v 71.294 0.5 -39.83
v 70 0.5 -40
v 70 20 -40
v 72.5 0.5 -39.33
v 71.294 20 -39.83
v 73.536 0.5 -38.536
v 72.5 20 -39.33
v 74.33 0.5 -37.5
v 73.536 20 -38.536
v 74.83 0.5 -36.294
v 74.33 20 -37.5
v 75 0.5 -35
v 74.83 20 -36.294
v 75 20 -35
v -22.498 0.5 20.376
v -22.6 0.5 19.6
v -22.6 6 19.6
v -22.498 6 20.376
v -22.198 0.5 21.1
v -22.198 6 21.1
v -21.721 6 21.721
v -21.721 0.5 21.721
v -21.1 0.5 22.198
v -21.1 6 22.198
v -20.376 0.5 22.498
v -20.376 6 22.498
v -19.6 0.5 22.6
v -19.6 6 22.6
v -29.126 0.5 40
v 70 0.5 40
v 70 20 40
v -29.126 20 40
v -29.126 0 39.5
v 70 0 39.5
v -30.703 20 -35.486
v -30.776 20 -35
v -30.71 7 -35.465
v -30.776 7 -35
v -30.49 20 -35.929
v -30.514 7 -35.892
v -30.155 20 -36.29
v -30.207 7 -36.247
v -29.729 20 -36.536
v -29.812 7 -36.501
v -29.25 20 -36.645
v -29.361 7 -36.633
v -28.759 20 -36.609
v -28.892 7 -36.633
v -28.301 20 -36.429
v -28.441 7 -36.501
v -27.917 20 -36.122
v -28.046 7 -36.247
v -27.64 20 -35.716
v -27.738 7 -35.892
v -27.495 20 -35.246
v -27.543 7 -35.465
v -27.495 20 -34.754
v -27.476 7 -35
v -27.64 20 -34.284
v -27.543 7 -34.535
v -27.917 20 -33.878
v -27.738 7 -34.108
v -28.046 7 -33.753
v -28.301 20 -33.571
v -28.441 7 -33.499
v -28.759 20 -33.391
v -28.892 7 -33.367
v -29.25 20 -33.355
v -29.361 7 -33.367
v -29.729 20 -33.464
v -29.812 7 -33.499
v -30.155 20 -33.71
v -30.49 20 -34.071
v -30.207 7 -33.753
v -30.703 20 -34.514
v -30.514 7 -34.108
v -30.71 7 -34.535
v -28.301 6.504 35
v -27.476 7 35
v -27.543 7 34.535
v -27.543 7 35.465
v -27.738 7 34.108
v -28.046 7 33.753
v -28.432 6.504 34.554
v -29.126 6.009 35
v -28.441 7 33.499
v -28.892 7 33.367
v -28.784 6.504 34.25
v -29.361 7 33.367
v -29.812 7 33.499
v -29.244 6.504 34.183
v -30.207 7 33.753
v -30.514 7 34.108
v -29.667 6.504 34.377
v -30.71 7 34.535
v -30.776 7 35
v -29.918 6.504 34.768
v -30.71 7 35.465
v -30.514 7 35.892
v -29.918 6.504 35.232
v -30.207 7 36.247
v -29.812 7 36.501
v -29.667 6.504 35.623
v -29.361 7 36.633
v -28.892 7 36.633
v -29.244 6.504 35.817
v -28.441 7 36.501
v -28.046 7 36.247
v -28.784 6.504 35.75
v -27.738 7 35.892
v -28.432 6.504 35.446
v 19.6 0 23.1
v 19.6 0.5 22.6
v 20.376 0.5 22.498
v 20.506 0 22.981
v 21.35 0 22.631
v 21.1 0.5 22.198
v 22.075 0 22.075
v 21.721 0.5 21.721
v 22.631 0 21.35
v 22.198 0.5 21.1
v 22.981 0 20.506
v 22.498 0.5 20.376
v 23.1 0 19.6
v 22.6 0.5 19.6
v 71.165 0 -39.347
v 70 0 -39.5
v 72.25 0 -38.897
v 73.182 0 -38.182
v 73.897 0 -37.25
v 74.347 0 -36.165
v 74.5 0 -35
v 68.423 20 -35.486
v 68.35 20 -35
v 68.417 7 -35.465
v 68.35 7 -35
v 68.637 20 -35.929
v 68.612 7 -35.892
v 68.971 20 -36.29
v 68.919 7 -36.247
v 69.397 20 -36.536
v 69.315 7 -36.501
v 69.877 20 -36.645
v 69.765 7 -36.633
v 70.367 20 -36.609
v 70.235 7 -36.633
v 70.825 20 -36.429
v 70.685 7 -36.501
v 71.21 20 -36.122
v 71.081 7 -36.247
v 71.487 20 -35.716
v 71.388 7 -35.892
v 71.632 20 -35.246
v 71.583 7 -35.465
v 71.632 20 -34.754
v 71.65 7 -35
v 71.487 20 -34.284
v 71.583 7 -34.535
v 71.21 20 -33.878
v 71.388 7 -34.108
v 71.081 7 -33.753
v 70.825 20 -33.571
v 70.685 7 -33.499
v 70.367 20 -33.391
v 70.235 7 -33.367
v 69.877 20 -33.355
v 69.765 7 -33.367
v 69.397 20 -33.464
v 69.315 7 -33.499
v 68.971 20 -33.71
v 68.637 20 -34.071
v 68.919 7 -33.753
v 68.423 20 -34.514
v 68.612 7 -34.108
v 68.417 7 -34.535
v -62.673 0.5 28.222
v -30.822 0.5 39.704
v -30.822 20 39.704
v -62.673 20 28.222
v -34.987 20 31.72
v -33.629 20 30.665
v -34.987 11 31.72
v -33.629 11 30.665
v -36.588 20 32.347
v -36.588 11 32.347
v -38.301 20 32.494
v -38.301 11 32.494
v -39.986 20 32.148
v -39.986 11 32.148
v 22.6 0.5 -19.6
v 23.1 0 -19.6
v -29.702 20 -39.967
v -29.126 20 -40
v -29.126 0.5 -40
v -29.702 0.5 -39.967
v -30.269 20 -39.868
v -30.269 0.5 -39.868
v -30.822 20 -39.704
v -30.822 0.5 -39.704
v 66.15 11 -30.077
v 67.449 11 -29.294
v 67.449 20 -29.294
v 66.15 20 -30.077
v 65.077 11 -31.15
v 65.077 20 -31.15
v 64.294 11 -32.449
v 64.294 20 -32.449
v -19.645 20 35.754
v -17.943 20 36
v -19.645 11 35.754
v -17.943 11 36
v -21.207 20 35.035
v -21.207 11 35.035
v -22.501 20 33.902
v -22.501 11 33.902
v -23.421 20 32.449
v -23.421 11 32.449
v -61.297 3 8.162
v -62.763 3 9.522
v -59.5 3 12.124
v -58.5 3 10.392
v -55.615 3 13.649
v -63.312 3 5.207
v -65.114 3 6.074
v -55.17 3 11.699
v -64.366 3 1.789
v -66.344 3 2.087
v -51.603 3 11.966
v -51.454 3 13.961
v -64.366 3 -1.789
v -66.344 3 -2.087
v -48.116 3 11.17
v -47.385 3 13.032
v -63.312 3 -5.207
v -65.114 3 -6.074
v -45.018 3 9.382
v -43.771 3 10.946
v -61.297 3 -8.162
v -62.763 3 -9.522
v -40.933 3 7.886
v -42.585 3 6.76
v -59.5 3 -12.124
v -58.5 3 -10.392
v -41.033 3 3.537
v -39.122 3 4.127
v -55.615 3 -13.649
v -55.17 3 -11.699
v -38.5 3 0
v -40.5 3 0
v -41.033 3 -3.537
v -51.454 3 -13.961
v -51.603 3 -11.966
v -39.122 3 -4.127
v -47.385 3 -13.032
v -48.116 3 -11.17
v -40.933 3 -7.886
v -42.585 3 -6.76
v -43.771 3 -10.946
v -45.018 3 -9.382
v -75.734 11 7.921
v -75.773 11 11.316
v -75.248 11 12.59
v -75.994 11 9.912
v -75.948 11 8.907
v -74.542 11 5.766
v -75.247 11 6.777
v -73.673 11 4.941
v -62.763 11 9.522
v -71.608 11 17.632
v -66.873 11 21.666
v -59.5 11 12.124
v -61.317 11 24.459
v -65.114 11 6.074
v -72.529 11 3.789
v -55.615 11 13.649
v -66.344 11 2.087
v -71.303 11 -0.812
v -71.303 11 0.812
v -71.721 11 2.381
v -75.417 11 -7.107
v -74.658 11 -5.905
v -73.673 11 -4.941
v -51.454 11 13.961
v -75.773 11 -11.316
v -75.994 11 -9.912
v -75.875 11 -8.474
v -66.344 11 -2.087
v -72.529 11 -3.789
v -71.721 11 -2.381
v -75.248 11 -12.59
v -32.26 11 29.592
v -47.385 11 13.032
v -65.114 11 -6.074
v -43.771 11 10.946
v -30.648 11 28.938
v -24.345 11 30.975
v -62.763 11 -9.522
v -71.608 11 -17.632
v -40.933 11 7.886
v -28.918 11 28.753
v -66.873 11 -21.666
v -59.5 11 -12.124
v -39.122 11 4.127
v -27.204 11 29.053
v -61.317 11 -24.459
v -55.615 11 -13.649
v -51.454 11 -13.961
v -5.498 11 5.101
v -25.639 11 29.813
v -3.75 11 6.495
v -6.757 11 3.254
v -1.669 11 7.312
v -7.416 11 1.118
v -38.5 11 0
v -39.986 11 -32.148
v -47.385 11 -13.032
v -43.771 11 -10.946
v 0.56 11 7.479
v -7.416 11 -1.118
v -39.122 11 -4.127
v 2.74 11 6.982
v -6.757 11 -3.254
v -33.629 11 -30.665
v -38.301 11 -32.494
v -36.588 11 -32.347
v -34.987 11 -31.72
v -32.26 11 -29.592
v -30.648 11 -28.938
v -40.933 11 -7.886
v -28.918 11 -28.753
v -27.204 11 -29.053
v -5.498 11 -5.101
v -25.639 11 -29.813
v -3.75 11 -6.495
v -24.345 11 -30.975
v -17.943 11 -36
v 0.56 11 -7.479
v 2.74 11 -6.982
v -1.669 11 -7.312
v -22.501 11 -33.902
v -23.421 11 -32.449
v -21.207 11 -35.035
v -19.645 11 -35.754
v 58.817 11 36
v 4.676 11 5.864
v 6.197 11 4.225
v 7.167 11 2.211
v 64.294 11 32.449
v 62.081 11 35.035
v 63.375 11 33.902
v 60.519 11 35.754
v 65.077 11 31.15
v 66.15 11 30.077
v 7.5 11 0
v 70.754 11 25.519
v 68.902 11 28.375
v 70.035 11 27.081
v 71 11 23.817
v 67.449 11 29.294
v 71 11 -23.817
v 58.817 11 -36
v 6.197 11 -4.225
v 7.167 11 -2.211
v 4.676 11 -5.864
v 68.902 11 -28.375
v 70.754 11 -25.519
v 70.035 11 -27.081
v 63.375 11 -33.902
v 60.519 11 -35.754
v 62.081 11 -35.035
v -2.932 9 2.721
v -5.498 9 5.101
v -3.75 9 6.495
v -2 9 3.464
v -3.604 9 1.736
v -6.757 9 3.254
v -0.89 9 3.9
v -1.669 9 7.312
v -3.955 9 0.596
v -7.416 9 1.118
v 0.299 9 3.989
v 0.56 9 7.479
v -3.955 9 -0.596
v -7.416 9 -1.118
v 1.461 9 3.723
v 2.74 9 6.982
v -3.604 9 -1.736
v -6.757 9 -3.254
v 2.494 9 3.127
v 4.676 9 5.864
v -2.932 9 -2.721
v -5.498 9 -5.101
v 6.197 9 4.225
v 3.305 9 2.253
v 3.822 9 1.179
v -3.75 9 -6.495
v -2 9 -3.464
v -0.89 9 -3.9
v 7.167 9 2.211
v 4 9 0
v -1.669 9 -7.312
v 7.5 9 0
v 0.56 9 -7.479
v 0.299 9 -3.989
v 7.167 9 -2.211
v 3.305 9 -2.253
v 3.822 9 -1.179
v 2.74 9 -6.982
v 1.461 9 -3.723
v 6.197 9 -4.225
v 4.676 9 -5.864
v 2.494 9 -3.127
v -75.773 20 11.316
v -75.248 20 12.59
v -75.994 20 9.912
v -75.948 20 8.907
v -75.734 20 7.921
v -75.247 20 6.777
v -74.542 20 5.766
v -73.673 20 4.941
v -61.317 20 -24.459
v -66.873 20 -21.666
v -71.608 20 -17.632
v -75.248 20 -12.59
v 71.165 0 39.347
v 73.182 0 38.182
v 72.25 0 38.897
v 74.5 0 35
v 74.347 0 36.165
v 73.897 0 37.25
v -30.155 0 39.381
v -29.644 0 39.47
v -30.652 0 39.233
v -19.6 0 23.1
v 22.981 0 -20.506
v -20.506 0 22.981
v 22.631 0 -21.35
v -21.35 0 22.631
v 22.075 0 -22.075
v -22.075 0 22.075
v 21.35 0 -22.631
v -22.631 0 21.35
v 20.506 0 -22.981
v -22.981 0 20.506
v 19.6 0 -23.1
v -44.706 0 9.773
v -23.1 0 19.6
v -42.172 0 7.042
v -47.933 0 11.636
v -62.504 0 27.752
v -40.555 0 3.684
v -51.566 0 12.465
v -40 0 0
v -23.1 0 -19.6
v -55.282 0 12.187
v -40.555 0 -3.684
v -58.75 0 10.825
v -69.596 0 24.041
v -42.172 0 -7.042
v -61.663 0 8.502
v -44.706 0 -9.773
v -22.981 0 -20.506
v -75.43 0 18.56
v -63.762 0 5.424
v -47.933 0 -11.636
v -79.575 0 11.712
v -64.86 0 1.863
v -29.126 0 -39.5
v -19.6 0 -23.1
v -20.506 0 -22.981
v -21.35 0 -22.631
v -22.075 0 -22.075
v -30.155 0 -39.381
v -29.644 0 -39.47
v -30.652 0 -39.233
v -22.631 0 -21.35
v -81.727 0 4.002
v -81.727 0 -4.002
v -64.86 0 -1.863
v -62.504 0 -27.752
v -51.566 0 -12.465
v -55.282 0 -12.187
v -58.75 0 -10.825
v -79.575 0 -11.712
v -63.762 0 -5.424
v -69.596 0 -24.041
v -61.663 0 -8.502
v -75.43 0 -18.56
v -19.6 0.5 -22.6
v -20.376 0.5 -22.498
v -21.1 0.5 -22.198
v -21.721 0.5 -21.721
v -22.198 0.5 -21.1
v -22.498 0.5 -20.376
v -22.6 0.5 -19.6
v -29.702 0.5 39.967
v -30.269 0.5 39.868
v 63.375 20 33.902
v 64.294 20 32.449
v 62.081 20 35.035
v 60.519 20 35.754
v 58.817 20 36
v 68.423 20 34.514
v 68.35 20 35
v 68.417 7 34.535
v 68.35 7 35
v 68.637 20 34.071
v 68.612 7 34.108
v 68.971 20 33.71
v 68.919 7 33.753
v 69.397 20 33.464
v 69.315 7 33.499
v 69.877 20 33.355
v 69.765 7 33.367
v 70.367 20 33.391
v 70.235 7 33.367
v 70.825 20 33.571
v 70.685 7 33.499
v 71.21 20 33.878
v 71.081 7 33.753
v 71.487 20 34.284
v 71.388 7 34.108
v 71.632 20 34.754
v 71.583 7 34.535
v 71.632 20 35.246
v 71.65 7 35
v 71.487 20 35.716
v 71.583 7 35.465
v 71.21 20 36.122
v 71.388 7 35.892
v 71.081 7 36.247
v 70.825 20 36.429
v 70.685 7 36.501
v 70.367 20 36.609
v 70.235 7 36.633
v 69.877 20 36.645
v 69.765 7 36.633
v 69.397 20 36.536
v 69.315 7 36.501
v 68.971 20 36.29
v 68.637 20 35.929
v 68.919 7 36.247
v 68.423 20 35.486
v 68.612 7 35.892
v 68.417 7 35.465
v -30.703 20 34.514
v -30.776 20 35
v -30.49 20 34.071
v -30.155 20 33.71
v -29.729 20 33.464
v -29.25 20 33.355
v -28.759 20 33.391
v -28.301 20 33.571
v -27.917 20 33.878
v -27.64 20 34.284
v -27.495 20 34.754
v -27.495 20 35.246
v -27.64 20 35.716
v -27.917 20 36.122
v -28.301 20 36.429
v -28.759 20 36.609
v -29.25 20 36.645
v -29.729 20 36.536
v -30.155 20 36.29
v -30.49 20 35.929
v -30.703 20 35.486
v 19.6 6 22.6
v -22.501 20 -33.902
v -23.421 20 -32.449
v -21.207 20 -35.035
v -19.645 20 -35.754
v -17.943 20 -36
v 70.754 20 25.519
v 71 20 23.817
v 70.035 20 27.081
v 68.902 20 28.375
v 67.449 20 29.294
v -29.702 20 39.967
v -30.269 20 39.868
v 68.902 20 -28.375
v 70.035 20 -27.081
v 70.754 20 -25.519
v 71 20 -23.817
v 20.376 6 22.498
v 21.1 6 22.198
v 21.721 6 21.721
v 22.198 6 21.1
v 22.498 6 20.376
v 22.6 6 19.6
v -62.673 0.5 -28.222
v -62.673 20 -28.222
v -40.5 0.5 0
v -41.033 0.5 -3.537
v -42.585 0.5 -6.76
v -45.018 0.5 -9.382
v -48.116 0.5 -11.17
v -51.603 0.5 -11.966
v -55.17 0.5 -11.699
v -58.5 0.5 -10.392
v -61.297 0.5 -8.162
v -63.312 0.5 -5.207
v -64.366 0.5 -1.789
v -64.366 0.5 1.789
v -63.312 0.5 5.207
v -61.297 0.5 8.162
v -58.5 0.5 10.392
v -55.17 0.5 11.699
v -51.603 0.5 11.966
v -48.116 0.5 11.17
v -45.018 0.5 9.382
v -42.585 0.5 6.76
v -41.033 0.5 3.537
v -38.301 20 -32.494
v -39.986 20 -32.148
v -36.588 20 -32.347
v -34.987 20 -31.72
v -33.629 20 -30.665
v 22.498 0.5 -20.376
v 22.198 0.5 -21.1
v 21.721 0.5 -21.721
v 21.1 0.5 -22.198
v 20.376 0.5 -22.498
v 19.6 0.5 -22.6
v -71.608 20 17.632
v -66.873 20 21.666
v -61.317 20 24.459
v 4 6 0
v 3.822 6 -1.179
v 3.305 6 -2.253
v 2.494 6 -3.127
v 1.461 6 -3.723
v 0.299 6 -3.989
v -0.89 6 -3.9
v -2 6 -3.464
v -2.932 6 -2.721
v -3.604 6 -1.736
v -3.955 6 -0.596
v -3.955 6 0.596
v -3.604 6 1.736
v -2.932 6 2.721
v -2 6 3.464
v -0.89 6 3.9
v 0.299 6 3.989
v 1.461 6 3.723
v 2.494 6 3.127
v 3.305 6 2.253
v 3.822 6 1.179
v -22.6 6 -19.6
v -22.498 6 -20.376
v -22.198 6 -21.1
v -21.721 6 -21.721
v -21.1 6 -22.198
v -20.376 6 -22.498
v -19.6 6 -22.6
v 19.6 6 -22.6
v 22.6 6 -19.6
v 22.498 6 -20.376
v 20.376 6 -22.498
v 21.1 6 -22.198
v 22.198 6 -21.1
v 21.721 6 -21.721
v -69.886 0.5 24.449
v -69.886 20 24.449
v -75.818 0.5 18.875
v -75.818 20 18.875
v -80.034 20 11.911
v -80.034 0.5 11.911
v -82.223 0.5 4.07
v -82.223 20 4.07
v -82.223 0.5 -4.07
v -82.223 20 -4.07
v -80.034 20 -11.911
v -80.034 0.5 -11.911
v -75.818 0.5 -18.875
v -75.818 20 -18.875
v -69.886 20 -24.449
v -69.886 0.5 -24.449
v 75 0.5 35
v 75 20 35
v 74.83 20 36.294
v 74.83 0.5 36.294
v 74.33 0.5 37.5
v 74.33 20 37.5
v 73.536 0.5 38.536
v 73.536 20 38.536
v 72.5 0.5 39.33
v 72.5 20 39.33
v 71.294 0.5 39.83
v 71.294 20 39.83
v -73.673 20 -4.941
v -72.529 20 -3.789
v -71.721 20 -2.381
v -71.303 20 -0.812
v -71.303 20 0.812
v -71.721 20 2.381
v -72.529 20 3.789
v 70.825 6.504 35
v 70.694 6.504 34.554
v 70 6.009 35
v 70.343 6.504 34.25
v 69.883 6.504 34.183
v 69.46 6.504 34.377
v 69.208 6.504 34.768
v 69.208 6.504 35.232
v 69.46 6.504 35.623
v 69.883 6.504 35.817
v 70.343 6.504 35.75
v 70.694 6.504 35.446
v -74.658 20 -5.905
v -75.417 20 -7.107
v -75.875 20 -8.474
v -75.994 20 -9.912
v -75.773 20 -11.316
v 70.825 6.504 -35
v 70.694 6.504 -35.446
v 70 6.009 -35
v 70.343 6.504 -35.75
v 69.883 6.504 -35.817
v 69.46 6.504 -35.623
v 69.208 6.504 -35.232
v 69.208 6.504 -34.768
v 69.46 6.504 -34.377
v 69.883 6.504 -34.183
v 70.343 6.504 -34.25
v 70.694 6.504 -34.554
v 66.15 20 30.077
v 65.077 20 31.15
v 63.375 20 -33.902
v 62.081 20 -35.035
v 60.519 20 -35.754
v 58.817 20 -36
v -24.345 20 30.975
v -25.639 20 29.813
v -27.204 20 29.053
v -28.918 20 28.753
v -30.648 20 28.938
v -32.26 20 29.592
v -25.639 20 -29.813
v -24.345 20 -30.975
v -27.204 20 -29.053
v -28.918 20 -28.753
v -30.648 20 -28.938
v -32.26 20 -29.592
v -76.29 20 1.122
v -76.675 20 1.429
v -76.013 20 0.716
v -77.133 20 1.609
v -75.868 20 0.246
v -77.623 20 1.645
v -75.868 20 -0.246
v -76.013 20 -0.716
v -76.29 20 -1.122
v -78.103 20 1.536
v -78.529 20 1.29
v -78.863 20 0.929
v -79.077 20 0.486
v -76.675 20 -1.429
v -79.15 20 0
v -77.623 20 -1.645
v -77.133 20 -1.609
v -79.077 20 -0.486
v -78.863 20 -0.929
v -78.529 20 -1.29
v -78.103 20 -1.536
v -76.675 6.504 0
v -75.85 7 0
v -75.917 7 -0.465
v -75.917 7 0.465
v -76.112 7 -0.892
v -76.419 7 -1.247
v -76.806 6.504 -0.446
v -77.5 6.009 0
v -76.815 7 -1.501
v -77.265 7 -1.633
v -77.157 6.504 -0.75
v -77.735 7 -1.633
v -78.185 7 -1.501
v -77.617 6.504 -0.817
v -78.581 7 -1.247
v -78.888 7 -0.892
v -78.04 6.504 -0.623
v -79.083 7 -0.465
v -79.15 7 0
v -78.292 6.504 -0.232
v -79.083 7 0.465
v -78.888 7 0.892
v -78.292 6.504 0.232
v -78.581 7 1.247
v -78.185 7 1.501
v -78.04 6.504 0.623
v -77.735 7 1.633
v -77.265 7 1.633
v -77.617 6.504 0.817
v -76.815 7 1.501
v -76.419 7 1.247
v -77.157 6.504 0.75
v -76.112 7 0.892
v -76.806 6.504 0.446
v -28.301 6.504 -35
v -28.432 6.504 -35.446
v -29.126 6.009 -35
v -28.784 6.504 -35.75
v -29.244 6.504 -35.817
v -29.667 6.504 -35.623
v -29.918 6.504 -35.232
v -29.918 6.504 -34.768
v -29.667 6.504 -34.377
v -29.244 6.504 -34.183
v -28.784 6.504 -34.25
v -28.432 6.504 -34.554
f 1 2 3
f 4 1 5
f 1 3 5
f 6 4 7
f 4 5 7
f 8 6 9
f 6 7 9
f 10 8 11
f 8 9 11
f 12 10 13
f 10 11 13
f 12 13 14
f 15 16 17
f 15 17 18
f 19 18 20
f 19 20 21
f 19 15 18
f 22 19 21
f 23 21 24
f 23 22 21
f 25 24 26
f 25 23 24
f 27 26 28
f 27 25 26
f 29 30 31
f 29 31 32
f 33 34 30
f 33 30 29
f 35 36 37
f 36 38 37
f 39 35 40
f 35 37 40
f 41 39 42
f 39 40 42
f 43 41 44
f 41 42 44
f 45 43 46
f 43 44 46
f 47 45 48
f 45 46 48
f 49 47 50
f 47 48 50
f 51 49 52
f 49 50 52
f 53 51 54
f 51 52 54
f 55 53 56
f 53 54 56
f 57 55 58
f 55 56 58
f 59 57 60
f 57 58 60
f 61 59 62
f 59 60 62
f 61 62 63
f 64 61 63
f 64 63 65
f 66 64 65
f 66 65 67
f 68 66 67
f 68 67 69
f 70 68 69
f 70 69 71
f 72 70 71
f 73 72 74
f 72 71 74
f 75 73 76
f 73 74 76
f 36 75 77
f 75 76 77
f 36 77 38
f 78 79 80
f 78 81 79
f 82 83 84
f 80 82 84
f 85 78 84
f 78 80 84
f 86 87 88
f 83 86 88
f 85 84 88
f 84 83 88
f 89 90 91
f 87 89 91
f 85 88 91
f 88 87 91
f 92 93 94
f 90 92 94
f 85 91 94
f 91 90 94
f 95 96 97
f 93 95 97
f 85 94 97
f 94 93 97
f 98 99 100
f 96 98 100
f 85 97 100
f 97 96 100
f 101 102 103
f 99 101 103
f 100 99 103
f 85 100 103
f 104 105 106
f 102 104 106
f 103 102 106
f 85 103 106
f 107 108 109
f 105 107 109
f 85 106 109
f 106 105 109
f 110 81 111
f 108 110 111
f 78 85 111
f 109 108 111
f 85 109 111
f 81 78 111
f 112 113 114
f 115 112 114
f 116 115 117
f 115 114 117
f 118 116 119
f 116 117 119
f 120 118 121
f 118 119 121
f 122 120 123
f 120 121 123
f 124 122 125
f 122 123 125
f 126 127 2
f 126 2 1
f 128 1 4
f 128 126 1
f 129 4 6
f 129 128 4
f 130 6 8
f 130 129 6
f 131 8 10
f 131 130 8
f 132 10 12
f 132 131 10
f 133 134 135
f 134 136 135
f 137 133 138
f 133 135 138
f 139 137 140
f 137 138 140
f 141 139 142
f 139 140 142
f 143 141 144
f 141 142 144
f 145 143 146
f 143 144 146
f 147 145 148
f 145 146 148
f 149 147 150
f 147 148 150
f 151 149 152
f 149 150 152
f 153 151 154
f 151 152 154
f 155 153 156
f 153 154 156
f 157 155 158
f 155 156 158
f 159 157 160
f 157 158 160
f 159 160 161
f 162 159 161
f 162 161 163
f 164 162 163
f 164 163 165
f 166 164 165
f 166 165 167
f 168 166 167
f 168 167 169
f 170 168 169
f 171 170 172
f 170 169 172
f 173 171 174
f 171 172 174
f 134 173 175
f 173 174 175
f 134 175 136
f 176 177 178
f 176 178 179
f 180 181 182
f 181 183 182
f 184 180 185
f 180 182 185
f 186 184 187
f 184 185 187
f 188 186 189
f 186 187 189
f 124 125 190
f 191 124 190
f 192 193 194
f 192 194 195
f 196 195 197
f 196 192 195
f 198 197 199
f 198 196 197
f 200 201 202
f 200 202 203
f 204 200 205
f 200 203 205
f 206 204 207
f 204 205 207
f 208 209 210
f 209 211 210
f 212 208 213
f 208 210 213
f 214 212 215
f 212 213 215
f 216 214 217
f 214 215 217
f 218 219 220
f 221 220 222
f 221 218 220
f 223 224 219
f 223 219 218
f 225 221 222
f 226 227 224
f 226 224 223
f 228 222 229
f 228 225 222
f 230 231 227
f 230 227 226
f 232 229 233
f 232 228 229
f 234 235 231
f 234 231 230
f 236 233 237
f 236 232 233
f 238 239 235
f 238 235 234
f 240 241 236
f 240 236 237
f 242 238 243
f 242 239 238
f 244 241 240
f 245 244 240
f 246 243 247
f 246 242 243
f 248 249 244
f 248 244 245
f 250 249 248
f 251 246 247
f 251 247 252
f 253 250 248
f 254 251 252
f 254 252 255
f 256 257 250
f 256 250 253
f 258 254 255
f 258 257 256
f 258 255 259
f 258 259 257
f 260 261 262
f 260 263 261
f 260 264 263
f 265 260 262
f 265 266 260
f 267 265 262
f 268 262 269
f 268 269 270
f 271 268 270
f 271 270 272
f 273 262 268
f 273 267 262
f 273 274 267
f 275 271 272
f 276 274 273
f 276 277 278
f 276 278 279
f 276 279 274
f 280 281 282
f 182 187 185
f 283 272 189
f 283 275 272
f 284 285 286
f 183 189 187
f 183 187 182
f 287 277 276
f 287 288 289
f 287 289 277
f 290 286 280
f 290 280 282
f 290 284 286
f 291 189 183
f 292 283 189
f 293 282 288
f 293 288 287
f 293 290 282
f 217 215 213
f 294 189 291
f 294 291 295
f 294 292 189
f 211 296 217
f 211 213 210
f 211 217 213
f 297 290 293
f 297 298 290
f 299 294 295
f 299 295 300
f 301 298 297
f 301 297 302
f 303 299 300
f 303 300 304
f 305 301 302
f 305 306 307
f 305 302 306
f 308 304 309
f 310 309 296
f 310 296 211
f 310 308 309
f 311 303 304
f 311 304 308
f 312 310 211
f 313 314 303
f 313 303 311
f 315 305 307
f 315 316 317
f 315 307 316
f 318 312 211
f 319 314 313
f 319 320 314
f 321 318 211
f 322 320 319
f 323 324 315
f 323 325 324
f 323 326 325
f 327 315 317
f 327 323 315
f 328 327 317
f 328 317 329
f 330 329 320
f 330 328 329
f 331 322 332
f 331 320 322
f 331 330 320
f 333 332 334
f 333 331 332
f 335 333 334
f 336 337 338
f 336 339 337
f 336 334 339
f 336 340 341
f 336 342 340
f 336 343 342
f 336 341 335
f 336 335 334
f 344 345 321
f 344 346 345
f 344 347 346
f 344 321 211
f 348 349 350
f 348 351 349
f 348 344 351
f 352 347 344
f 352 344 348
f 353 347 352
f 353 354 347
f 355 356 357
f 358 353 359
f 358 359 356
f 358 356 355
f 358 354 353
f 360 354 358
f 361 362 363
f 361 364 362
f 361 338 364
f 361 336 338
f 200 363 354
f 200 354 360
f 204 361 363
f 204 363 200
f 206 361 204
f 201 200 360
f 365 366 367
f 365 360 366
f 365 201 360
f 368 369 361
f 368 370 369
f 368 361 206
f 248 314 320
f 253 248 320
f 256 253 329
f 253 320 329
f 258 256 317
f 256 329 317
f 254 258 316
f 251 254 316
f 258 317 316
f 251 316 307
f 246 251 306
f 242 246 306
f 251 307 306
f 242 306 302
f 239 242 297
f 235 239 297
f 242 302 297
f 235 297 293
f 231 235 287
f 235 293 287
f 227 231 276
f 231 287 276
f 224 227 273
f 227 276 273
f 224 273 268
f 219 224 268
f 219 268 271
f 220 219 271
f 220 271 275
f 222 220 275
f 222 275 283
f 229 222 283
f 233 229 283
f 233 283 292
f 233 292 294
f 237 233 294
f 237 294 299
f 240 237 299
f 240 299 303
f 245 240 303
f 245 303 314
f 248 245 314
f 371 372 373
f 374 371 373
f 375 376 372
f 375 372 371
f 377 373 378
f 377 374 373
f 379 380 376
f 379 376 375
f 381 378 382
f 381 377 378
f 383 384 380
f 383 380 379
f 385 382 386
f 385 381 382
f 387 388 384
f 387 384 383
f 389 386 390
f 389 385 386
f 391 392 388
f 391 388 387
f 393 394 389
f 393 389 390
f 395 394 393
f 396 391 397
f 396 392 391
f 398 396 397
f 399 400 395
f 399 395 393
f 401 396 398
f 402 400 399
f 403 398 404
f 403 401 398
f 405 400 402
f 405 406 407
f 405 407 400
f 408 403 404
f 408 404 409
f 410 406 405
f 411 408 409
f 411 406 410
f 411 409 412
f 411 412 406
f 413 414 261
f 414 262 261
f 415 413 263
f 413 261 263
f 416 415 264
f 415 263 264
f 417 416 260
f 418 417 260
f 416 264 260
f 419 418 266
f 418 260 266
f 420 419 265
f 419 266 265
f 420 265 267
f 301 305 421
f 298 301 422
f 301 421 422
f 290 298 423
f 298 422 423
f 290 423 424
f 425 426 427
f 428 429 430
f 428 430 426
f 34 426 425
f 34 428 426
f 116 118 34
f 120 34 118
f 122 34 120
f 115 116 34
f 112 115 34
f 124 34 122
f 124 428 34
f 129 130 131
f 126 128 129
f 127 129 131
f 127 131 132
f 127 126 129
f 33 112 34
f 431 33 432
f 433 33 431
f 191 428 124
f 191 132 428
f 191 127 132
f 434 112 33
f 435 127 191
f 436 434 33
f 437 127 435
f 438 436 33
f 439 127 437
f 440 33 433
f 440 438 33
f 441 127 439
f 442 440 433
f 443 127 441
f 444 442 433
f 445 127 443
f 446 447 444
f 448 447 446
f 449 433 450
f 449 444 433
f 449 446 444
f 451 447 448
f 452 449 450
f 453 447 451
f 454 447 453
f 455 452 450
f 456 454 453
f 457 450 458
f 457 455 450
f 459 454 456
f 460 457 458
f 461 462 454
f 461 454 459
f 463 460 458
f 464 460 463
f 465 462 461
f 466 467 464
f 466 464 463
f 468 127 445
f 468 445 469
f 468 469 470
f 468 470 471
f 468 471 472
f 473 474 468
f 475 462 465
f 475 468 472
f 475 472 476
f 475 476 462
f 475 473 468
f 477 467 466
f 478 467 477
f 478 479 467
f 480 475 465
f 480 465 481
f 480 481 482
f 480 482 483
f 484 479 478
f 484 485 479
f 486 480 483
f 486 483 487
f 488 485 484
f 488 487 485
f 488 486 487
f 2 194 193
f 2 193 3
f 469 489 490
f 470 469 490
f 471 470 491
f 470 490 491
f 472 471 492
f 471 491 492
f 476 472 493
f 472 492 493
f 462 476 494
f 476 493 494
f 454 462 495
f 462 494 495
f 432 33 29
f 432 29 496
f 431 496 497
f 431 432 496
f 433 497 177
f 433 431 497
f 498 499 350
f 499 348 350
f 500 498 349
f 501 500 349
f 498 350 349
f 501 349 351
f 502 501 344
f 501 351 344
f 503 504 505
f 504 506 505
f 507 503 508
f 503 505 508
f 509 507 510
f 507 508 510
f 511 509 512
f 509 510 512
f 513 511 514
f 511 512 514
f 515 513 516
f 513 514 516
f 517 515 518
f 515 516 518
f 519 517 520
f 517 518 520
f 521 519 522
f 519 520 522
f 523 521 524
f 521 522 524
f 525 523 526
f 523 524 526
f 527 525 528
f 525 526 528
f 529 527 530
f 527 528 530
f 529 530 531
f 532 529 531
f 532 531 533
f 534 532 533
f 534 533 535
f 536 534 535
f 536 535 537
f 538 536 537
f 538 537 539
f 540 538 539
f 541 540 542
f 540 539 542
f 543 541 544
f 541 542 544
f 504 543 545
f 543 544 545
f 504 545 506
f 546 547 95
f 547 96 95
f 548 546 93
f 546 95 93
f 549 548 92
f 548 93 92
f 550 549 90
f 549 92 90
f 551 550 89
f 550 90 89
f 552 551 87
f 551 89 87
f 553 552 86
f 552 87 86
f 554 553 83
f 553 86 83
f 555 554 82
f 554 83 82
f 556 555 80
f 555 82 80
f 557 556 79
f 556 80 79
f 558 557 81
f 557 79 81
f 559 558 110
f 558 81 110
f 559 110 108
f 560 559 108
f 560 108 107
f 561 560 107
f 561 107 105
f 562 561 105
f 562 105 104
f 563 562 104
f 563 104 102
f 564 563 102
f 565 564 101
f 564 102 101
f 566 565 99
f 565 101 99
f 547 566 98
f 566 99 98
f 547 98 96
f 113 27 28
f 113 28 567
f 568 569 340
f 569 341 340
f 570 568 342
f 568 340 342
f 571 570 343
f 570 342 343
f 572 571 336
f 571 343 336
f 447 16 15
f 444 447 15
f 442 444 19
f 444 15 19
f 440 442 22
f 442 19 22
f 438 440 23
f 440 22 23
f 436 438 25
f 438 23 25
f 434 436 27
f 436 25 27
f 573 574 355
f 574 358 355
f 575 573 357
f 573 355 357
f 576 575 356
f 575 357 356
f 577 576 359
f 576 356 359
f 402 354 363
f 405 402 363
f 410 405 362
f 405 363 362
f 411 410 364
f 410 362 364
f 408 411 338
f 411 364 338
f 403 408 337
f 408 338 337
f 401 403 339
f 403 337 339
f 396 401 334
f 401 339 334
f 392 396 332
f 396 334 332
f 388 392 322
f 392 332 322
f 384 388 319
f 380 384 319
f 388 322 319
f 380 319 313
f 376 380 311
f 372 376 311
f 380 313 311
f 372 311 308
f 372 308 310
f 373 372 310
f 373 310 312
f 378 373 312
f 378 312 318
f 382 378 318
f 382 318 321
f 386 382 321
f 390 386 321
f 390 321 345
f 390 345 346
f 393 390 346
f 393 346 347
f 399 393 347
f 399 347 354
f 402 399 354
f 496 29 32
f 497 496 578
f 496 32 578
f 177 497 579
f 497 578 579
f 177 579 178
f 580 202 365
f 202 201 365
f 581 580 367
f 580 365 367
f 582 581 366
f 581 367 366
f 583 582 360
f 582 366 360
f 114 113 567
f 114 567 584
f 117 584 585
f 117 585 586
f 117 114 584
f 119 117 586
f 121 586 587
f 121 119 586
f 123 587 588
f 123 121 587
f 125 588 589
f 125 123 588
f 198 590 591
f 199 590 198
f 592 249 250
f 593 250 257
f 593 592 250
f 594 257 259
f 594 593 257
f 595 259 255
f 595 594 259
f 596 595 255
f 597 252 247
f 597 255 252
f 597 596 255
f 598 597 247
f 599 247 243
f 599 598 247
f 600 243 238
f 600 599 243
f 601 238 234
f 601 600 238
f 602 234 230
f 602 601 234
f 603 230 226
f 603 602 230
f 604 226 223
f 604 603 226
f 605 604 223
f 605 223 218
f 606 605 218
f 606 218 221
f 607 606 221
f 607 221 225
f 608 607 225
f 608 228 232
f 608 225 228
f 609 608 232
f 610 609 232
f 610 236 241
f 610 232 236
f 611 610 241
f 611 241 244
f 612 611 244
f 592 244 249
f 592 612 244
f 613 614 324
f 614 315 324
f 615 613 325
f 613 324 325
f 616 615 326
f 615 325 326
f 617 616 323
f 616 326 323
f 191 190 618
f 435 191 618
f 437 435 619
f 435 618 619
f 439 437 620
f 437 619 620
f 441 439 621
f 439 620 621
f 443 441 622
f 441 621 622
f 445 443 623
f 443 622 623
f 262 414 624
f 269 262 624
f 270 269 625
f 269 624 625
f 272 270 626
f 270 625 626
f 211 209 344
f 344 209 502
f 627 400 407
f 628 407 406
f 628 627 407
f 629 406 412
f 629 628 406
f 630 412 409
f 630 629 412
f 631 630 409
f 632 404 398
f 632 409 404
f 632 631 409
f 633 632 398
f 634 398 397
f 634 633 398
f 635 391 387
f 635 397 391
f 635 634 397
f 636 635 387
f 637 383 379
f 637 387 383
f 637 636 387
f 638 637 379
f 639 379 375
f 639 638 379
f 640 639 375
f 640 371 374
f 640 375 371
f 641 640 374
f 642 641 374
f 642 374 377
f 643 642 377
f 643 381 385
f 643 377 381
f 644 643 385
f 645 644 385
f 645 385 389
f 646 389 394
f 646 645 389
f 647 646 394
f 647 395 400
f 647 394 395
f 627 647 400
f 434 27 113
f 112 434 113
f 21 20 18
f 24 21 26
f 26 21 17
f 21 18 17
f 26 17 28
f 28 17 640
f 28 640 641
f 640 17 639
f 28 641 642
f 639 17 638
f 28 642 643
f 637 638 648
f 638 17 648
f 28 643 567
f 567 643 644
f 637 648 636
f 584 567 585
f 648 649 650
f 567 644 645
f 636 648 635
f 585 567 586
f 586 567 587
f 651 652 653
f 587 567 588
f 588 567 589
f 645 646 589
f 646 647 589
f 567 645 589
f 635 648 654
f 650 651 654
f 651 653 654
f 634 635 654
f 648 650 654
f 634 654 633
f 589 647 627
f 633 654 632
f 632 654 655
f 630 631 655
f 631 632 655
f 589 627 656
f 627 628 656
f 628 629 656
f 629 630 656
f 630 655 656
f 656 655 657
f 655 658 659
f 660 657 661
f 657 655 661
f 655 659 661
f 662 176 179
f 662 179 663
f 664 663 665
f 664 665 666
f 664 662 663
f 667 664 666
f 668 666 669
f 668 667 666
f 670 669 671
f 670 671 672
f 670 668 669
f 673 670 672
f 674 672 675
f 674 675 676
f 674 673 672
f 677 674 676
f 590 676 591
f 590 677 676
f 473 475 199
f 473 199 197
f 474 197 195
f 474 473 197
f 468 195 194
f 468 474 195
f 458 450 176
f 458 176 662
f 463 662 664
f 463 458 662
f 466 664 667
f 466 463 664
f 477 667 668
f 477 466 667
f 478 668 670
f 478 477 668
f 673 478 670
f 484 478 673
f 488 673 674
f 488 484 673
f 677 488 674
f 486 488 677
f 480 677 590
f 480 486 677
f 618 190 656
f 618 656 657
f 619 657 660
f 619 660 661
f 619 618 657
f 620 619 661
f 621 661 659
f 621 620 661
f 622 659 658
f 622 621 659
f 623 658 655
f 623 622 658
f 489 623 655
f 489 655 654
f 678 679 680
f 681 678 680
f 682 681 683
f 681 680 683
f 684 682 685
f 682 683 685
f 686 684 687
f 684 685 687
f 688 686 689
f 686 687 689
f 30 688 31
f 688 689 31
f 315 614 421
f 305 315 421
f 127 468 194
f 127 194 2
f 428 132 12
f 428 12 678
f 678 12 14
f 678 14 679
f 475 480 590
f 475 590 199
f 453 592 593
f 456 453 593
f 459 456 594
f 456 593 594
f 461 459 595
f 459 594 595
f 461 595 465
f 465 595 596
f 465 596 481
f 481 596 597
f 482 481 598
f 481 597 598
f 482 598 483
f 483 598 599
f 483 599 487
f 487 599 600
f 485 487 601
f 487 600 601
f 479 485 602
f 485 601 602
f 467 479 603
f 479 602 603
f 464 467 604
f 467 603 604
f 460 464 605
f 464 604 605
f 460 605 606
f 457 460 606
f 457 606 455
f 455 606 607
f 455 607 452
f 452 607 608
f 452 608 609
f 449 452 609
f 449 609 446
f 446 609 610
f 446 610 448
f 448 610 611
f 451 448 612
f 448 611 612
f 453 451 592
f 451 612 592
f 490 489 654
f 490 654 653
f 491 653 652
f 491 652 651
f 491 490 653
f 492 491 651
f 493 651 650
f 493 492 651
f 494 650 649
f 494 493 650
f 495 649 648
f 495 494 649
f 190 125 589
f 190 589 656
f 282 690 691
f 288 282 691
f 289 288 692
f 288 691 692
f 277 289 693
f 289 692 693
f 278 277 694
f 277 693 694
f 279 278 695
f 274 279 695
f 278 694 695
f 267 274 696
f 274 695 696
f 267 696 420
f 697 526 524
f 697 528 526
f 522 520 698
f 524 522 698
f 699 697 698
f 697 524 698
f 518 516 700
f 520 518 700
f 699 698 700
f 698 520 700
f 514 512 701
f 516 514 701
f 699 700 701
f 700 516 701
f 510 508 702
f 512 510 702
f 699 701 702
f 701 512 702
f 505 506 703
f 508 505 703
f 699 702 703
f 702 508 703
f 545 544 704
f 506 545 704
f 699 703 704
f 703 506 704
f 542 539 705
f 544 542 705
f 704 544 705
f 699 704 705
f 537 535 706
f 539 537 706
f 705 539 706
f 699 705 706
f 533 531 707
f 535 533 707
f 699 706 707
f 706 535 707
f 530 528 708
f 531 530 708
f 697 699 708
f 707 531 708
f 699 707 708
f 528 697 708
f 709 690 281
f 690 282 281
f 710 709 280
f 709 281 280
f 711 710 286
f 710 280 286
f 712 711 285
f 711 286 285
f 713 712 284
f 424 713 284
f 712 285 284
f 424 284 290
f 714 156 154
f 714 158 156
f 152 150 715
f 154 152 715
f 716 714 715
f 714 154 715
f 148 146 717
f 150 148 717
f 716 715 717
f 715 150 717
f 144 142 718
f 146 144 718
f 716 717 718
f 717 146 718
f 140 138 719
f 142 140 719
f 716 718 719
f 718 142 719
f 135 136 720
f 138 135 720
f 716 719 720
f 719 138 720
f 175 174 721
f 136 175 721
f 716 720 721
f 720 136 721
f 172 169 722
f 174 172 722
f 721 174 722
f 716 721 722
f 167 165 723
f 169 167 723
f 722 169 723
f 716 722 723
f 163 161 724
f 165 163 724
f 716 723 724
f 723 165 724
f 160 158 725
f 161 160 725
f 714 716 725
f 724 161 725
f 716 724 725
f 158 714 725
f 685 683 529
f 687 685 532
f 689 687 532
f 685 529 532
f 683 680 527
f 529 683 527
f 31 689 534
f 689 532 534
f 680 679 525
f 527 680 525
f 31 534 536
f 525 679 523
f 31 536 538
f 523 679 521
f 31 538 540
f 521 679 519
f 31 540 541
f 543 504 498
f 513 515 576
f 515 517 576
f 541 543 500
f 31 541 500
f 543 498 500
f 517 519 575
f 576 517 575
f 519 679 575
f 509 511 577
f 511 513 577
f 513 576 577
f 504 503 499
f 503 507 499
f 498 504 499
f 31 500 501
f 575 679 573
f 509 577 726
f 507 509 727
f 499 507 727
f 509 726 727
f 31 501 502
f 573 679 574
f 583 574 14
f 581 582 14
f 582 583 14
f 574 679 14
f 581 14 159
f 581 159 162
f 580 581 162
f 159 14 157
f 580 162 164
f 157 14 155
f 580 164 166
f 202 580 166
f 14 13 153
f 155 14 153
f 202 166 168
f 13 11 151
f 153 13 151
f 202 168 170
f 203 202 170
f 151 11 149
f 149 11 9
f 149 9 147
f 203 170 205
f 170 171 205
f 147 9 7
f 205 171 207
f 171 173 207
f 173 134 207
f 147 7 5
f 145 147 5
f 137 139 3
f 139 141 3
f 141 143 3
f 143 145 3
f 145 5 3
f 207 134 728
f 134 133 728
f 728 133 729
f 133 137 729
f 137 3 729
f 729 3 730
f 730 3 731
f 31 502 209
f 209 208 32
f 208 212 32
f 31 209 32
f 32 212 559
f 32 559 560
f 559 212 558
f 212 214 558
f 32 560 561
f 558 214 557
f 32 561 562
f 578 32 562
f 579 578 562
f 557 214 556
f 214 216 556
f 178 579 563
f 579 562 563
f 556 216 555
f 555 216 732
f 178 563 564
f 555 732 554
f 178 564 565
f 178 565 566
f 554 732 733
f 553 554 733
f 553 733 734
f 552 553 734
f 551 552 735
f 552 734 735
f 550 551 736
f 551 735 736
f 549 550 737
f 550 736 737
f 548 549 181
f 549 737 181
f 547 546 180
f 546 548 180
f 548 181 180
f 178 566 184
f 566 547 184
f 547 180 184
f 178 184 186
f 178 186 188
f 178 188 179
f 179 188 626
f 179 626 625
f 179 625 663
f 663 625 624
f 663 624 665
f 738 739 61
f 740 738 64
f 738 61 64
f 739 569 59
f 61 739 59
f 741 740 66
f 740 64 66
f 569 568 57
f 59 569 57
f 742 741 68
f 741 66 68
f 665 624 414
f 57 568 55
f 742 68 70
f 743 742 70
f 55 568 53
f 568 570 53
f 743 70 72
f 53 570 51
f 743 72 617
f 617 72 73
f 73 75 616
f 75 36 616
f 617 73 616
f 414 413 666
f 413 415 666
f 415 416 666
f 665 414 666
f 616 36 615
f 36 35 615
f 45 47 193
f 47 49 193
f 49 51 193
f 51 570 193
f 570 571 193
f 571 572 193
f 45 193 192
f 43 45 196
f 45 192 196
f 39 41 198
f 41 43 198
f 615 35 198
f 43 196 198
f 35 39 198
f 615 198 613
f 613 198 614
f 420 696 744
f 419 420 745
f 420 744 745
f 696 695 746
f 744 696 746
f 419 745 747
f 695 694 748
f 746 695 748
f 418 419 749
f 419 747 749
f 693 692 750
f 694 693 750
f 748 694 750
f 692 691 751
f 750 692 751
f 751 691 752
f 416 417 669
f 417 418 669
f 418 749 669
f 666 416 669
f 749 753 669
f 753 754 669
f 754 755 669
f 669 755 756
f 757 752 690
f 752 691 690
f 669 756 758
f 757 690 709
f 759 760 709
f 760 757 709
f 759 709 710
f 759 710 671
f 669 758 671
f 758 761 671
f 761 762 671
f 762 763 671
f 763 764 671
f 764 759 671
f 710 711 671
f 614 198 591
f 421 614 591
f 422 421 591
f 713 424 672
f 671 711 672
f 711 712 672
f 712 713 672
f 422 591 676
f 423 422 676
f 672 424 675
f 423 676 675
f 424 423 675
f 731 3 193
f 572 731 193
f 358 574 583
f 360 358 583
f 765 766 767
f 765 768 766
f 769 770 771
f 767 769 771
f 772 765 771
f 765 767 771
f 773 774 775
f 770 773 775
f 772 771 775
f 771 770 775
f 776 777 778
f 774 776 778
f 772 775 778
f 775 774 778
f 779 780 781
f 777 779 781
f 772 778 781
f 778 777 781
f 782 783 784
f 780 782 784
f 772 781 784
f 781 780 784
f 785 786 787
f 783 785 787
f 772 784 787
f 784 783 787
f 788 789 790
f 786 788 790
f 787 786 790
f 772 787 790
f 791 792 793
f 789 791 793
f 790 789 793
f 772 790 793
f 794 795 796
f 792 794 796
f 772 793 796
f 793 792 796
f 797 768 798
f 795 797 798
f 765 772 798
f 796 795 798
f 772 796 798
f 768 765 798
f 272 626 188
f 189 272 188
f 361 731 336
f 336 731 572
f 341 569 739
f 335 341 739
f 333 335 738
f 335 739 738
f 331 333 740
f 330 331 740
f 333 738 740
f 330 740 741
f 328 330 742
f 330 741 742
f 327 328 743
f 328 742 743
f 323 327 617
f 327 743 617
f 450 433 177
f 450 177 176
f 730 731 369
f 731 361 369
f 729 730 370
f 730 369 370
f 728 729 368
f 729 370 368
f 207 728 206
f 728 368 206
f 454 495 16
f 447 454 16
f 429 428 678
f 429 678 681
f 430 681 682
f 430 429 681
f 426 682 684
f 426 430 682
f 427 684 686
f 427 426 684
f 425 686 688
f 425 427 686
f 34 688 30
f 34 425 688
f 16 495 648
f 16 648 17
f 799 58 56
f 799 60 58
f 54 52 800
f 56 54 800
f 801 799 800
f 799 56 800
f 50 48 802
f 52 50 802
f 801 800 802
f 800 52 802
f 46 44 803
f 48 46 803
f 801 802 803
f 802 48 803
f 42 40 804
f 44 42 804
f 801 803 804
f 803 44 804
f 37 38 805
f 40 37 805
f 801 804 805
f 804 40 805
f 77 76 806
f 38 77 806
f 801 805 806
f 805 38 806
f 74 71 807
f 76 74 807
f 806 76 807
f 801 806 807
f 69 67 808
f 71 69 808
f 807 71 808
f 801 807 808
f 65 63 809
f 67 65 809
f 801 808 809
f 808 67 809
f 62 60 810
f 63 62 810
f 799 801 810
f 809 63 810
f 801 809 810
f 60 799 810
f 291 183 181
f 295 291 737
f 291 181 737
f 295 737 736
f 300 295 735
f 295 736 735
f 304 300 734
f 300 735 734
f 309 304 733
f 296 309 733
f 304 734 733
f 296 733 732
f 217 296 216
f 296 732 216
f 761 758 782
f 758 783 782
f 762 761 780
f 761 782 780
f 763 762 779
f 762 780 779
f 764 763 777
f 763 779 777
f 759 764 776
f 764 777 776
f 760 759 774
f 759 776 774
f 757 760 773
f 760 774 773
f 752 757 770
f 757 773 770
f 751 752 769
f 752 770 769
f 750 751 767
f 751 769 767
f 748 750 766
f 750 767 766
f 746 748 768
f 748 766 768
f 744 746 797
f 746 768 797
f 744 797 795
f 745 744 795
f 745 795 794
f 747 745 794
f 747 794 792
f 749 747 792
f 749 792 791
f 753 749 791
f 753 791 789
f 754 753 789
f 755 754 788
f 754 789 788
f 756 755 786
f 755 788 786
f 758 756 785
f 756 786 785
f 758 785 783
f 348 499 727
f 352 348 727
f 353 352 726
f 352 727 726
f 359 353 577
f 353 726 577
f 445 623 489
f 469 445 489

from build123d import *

# Parameters (mm, degrees)
SKETCH2_R                   = 4
SKETCH2_R_2                 = 12
BOSS_EXTRUDE1_DEPTH         = 20
FILLET1_R                   = 5
SKETCH2_3_R                 = 4
CUT_EXTRUDE1_DEPTH          = 6
SKETCH3_R                   = 14
CUT_EXTRUDE2_DEPTH          = 17
SKETCH4_R                   = 7.5
CUT_EXTRUDE3_DEPTH          = 11
TAP_DRILL_FOR_M4_TAP1_D     = 3.3
TAP_DRILL_FOR_M4_TAP1_DEPTH = 13
TAP_DRILL_FOR_M4_TAP1_TIP   = 0.991420021
CUT_EXTRUDE4_DEPTH          = 9
FILLET2_R                   = 6
CHAMFER1_SIZE               = 0.5


with BuildPart() as part:
    # Sketch2 → Boss-Extrude1 (new body)
    with BuildSketch(Plane(origin=(0, 0, 0), x_dir=(1, 0, 0), z_dir=(0, 1, 0))):
        with BuildLine():
            Line((-30, 40), (75, 40))
            Line((75, 40), (75, -40))
            Line((75, -40), (-30, -40))
            Line((-30, -40), (-62.673213991, -28.22243287))
            ThreePointArc((-62.673213991, -28.22243287), (-82.5, 0), (-62.673213991, 28.22243287))
            Line((-62.673213991, 28.22243287), (-30, 40))
        make_face()
        Circle(SKETCH2_R, mode=Mode.SUBTRACT)
        with Locations((-52.5, 0)):
            Circle(SKETCH2_R_2, mode=Mode.SUBTRACT)
    extrude(amount=BOSS_EXTRUDE1_DEPTH)

    # Fillet1
    fillet1_edges = [part.edges().sort_by_distance(p)[0] for p in [
        (-30, 10, -40),
        (75, 10, -40),
        (75, 10, 40),
        (-30, 10, 40),
    ]]
    fillet(fillet1_edges, radius=FILLET1_R)

    # Sketch2<3> → Cut-Extrude1 (cut)
    with BuildSketch(Plane(origin=(0, 0, 0), x_dir=(1, 0, 0), z_dir=(0, 1, 0))):
        with BuildLine():
            Line((22.6, -19.6), (22.6, 19.6))
            ThreePointArc((22.6, 19.6), (21.721320344, 21.721320344), (19.6, 22.6))
            Line((19.6, 22.6), (-19.6, 22.6))
            ThreePointArc((-19.6, 22.6), (-21.721320344, 21.721320344), (-22.6, 19.6))
            Line((-22.6, 19.6), (-22.6, -19.6))
            ThreePointArc((-22.6, -19.6), (-21.721320344, -21.721320344), (-19.6, -22.6))
            Line((-19.6, -22.6), (19.6, -22.6))
            ThreePointArc((19.6, -22.6), (21.721320344, -21.721320344), (22.6, -19.6))
        make_face()
        Circle(SKETCH2_3_R, mode=Mode.SUBTRACT)
    extrude(amount=CUT_EXTRUDE1_DEPTH, mode=Mode.SUBTRACT)

    # Sketch3 → Cut-Extrude2 (cut)
    with BuildSketch(Plane(origin=(0, 20, 0), x_dir=(1, 0, 0), z_dir=(0, 1, 0))):
        with Locations((-52.5, 0)):
            Circle(SKETCH3_R)
    extrude(amount=-CUT_EXTRUDE2_DEPTH, mode=Mode.SUBTRACT)

    # Sketch4 → Cut-Extrude3 (cut)
    with BuildSketch(Plane(origin=(0, 20, 0), x_dir=(1, 0, 0), z_dir=(0, 1, 0))):
        Circle(SKETCH4_R)
    extrude(amount=-CUT_EXTRUDE3_DEPTH, mode=Mode.SUBTRACT)

    # Tap Drill for M4 Tap1
    with Locations(Plane(origin=(0, 20, 0), x_dir=(1, 0, 0), z_dir=(0, 1, 0))):
        with Locations((70, 35), (-77.5, 0), (-29.126349288, 35), (-29.126349288, -35), (70, -35)):
            Hole(TAP_DRILL_FOR_M4_TAP1_D / 2, depth=TAP_DRILL_FOR_M4_TAP1_DEPTH)
            with Locations((0, 0, -(TAP_DRILL_FOR_M4_TAP1_DEPTH + TAP_DRILL_FOR_M4_TAP1_TIP / 2))):  # 118° drill point
                Cone(0, TAP_DRILL_FOR_M4_TAP1_D / 2, TAP_DRILL_FOR_M4_TAP1_TIP, mode=Mode.SUBTRACT)

    # Sketch7 → Cut-Extrude4 (cut)
    with BuildSketch(Plane(origin=(0, 20, 0), x_dir=(1, 0, 0), z_dir=(0, 1, 0))):
        with BuildLine():
            Line((-61.316785459, -24.459441821), (-35.269382186, -33.848632633))
            ThreePointArc((-35.269382186, -33.848632633), (-28.050584319, -28.843277679), (-22.956867948, -36))
            Line((-22.956867948, -36), (63.83051866, -36))
            ThreePointArc((63.83051866, -36), (65.580582618, -30.580582618), (71, -28.83051866))
            Line((71, -28.83051866), (71, 28.83051866))
            ThreePointArc((71, 28.83051866), (65.580582618, 30.580582618), (63.83051866, 36))
            Line((63.83051866, 36), (-22.956867948, 36))
            ThreePointArc((-22.956867948, 36), (-28.050584319, 28.843277679), (-35.269382186, 33.848632633))
            Line((-35.269382186, 33.848632633), (-61.316785459, 24.459441821))
            ThreePointArc((-61.316785459, 24.459441821), (-71.810161981, 17.410274101), (-77.73875, 6.24543821))
            ThreePointArc((-77.73875, 6.24543821), (-71.25, 0), (-77.73875, -6.24543821))
            ThreePointArc((-77.73875, -6.24543821), (-71.810161981, -17.410274101), (-61.316785459, -24.459441821))
        make_face()
    extrude(amount=-CUT_EXTRUDE4_DEPTH, mode=Mode.SUBTRACT)

    # Fillet2
    fillet2_edges = [part.edges().sort_by_distance(p)[0] for p in [
        (71, 15.5, 28.83051866),
        (63.83051866, 15.5, 36),
        (-22.956867948, 15.5, 36),
        (-35.269382186, 15.5, 33.848632633),
        (-77.73875, 15.5, 6.24543821),
        (-77.73875, 15.5, -6.24543821),
        (-35.269382186, 15.5, -33.848632633),
        (-22.956867948, 15.5, -36),
        (63.83051866, 15.5, -36),
        (71, 15.5, -28.83051866),
    ]]
    fillet(fillet2_edges, radius=FILLET2_R)

    # Chamfer1
    chamfer1_edges = [part.edges().sort_by_distance(p)[0] for p in [
        (-46.747549472, 0, 33.963085841),
        (-82.5, 0, 0),
        (-64.5, 0, 0),
        (20.436825356, 0, 40),
        (-46.747549472, 0, -33.963085841),
        (20.436825356, 0, -40),
        (75, 0, 0),
        (-29.986961262, 0, -39.925377856),
        (73.535533906, 0, -38.535533906),
        (73.535533906, 0, 38.535533906),
        (-29.986961262, 0, 39.925377856),
        (22.6, 0, 0),
        (21.721320344, 0, -21.721320344),
        (0, 0, -22.6),
        (-21.721320344, 0, -21.721320344),
        (21.721320344, 0, 21.721320344),
        (0, 0, 22.6),
        (-21.721320344, 0, 21.721320344),
        (-22.6, 0, 0),
    ]]
    chamfer(chamfer1_edges, length=CHAMFER1_SIZE)


solid = part.part
